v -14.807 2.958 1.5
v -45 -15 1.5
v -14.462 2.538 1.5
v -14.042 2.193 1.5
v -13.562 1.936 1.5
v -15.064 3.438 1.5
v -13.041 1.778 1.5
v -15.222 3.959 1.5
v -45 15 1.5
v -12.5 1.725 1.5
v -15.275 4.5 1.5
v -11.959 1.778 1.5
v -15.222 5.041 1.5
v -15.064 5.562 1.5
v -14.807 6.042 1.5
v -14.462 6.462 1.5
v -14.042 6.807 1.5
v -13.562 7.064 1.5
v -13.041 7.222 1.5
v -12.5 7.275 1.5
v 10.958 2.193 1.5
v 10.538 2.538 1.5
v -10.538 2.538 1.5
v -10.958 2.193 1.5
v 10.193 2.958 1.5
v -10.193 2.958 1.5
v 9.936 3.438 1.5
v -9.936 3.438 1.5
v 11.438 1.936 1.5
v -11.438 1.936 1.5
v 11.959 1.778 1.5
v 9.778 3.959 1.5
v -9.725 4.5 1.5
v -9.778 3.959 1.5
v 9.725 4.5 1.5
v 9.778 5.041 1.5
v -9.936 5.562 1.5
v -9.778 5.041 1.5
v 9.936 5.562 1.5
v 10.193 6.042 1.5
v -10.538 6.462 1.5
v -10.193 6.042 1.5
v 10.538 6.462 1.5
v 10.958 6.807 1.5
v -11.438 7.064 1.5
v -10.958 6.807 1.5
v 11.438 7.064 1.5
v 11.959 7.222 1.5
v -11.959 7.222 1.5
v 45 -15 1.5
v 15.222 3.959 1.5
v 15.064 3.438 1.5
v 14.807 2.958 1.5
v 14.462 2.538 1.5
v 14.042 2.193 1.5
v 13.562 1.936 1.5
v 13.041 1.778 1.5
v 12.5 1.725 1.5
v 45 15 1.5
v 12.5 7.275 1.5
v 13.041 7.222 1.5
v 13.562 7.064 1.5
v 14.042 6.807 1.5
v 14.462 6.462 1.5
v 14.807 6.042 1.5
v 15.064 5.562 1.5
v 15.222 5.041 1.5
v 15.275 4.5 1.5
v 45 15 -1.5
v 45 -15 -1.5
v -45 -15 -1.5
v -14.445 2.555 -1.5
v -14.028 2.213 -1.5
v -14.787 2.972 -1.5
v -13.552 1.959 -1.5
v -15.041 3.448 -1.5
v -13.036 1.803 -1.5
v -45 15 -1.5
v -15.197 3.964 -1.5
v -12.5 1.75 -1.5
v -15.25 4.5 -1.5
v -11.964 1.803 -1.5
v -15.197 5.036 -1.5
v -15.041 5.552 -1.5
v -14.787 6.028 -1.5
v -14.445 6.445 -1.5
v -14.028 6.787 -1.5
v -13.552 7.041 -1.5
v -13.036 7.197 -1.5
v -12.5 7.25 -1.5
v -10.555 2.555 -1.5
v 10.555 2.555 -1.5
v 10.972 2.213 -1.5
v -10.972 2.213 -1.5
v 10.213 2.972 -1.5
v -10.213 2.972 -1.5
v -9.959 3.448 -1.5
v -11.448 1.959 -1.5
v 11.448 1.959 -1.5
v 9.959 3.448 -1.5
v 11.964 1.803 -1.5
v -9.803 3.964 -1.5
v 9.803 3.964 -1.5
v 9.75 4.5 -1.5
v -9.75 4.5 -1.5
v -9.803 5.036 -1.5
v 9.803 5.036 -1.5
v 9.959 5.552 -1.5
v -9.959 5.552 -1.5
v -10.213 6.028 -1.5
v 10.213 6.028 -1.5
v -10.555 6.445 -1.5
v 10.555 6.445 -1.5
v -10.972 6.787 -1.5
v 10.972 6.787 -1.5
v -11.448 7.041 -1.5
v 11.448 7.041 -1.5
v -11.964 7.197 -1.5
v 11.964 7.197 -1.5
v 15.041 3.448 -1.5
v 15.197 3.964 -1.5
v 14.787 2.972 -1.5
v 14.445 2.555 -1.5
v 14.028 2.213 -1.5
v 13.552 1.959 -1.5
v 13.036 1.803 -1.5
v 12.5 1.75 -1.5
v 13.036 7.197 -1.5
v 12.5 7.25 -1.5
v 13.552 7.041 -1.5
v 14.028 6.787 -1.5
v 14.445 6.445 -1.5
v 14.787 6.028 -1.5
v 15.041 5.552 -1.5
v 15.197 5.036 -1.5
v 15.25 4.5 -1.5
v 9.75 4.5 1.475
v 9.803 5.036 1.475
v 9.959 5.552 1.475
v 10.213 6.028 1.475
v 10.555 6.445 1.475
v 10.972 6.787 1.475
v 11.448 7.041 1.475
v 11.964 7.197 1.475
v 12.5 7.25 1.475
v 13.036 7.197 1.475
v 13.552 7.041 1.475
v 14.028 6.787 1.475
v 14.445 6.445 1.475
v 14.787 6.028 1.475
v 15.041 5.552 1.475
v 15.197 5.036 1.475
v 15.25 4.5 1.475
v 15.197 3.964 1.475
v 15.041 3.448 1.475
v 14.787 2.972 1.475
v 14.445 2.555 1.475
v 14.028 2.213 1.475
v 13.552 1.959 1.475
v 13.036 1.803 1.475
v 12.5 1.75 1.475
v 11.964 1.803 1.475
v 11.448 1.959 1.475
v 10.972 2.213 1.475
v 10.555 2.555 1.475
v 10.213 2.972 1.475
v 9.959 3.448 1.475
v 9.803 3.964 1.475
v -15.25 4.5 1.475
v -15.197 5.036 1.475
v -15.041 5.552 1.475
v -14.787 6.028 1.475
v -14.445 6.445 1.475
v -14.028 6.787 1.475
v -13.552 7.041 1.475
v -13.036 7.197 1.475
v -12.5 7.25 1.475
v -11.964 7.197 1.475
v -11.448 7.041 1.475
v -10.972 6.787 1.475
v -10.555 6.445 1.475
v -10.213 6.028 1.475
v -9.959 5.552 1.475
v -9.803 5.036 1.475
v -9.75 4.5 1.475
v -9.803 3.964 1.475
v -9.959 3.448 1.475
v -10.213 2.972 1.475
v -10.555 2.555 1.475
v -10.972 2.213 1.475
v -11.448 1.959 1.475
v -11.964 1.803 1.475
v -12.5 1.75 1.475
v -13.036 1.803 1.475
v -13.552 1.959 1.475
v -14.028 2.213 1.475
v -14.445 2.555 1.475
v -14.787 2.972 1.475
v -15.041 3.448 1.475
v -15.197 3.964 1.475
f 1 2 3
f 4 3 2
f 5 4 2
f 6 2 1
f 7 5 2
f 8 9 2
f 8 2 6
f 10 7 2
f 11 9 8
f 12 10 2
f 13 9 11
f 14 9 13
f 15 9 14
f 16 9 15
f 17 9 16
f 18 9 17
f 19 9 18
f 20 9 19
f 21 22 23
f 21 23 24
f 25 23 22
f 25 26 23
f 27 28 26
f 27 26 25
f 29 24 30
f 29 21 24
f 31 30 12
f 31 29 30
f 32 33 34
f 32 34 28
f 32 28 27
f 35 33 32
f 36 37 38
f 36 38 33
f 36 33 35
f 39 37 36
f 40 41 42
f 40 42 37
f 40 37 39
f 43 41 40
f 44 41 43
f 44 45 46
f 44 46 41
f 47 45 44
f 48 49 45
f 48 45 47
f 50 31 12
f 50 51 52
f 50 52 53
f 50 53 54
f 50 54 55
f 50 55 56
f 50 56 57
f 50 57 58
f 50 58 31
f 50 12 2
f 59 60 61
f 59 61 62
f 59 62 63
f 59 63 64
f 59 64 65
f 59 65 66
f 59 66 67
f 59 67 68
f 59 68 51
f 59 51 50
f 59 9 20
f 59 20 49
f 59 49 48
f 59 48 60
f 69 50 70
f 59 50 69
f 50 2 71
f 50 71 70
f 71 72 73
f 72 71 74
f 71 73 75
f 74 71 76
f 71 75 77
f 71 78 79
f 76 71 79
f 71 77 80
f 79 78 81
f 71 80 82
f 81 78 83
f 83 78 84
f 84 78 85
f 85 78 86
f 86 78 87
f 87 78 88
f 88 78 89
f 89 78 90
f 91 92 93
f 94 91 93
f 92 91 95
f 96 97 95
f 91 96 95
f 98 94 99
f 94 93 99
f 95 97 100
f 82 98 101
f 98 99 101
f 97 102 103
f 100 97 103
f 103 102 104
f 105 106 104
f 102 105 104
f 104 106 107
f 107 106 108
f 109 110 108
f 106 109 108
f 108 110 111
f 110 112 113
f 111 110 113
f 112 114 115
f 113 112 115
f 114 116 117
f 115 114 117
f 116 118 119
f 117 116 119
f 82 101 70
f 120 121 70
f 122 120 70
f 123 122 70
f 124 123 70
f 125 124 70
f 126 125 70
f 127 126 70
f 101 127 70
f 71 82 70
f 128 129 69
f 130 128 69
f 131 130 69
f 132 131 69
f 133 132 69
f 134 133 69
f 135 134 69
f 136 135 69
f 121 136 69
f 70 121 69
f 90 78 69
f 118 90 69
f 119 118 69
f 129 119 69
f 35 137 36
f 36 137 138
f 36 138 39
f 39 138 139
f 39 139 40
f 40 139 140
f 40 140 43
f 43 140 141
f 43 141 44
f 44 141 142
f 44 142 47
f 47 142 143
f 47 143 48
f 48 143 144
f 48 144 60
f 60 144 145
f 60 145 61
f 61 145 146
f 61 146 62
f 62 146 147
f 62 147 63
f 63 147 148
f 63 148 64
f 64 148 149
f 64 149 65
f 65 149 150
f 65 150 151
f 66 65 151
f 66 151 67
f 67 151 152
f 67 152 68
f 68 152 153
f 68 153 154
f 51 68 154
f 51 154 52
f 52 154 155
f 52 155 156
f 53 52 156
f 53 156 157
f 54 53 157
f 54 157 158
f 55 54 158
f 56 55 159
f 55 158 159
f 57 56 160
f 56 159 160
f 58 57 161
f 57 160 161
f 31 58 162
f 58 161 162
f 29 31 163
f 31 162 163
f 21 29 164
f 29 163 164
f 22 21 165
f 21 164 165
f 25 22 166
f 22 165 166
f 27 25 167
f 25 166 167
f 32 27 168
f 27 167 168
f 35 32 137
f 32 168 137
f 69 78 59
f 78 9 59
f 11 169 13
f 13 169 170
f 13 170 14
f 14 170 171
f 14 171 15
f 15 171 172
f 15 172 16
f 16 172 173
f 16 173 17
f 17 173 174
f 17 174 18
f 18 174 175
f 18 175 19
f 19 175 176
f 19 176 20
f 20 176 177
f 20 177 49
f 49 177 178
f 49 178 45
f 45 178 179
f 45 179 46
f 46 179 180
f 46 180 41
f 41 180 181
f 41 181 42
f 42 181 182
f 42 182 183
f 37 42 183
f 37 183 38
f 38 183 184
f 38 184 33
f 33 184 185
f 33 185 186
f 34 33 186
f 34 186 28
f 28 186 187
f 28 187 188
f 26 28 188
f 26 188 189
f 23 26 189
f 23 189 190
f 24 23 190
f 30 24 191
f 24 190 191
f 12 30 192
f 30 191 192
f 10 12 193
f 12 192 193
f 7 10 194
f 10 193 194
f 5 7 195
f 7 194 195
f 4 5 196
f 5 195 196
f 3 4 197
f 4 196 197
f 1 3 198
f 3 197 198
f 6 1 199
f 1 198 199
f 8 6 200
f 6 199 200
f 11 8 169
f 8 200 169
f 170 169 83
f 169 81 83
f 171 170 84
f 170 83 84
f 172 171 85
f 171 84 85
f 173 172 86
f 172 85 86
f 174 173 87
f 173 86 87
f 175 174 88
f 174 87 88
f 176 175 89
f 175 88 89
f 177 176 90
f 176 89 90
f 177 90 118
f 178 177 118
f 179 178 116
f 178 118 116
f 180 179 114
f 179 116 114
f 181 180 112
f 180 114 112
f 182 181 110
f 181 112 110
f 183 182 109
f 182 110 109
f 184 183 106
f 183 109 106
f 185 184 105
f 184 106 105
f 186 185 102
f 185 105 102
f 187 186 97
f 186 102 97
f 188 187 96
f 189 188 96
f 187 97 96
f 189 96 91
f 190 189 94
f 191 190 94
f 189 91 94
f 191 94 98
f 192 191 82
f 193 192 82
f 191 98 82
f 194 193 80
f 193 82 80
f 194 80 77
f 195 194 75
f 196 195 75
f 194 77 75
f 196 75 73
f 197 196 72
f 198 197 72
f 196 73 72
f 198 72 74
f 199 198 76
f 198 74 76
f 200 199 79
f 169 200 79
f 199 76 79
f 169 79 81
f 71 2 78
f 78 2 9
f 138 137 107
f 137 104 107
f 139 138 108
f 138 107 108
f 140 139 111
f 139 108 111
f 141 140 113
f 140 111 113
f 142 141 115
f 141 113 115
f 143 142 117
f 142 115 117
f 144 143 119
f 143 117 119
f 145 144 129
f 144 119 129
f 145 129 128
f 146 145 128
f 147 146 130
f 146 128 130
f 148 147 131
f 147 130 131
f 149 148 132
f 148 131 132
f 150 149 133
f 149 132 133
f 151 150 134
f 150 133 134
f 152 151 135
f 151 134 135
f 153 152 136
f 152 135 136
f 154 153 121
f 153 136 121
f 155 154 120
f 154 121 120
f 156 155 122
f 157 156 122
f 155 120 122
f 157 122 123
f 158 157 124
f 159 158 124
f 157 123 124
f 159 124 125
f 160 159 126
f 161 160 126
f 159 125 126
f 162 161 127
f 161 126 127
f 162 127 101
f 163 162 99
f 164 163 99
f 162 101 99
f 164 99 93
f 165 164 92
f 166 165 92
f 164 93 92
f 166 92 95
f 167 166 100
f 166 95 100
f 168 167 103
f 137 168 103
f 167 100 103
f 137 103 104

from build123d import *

# Parameters (mm, degrees)
SKETCH1_W                      = 90
SKETCH1_H                      = 30
BOSS_EXTRUDE1_DEPTH            = 1.5
M5_CLEARANCE_HOLE1_D           = 5.5
M5_CLEARANCE_HOLE1_CSINK_D     = 5.55
M5_CLEARANCE_HOLE1_CSINK_ANGLE = 90


with BuildPart() as part:
    # Sketch1 → Boss-Extrude1 (new, symmetric)
    with BuildSketch(Plane.XY):
        Rectangle(SKETCH1_W, SKETCH1_H)
    extrude(amount=BOSS_EXTRUDE1_DEPTH, both=True)

    # M5 Clearance Hole1 (through all)
    with Locations(Plane.XY.offset(1.5)):
        with Locations((12.5, 4.5), (-12.5, 4.5)):
            CounterSinkHole(M5_CLEARANCE_HOLE1_D / 2, M5_CLEARANCE_HOLE1_CSINK_D / 2, counter_sink_angle=M5_CLEARANCE_HOLE1_CSINK_ANGLE)


solid = part.part
